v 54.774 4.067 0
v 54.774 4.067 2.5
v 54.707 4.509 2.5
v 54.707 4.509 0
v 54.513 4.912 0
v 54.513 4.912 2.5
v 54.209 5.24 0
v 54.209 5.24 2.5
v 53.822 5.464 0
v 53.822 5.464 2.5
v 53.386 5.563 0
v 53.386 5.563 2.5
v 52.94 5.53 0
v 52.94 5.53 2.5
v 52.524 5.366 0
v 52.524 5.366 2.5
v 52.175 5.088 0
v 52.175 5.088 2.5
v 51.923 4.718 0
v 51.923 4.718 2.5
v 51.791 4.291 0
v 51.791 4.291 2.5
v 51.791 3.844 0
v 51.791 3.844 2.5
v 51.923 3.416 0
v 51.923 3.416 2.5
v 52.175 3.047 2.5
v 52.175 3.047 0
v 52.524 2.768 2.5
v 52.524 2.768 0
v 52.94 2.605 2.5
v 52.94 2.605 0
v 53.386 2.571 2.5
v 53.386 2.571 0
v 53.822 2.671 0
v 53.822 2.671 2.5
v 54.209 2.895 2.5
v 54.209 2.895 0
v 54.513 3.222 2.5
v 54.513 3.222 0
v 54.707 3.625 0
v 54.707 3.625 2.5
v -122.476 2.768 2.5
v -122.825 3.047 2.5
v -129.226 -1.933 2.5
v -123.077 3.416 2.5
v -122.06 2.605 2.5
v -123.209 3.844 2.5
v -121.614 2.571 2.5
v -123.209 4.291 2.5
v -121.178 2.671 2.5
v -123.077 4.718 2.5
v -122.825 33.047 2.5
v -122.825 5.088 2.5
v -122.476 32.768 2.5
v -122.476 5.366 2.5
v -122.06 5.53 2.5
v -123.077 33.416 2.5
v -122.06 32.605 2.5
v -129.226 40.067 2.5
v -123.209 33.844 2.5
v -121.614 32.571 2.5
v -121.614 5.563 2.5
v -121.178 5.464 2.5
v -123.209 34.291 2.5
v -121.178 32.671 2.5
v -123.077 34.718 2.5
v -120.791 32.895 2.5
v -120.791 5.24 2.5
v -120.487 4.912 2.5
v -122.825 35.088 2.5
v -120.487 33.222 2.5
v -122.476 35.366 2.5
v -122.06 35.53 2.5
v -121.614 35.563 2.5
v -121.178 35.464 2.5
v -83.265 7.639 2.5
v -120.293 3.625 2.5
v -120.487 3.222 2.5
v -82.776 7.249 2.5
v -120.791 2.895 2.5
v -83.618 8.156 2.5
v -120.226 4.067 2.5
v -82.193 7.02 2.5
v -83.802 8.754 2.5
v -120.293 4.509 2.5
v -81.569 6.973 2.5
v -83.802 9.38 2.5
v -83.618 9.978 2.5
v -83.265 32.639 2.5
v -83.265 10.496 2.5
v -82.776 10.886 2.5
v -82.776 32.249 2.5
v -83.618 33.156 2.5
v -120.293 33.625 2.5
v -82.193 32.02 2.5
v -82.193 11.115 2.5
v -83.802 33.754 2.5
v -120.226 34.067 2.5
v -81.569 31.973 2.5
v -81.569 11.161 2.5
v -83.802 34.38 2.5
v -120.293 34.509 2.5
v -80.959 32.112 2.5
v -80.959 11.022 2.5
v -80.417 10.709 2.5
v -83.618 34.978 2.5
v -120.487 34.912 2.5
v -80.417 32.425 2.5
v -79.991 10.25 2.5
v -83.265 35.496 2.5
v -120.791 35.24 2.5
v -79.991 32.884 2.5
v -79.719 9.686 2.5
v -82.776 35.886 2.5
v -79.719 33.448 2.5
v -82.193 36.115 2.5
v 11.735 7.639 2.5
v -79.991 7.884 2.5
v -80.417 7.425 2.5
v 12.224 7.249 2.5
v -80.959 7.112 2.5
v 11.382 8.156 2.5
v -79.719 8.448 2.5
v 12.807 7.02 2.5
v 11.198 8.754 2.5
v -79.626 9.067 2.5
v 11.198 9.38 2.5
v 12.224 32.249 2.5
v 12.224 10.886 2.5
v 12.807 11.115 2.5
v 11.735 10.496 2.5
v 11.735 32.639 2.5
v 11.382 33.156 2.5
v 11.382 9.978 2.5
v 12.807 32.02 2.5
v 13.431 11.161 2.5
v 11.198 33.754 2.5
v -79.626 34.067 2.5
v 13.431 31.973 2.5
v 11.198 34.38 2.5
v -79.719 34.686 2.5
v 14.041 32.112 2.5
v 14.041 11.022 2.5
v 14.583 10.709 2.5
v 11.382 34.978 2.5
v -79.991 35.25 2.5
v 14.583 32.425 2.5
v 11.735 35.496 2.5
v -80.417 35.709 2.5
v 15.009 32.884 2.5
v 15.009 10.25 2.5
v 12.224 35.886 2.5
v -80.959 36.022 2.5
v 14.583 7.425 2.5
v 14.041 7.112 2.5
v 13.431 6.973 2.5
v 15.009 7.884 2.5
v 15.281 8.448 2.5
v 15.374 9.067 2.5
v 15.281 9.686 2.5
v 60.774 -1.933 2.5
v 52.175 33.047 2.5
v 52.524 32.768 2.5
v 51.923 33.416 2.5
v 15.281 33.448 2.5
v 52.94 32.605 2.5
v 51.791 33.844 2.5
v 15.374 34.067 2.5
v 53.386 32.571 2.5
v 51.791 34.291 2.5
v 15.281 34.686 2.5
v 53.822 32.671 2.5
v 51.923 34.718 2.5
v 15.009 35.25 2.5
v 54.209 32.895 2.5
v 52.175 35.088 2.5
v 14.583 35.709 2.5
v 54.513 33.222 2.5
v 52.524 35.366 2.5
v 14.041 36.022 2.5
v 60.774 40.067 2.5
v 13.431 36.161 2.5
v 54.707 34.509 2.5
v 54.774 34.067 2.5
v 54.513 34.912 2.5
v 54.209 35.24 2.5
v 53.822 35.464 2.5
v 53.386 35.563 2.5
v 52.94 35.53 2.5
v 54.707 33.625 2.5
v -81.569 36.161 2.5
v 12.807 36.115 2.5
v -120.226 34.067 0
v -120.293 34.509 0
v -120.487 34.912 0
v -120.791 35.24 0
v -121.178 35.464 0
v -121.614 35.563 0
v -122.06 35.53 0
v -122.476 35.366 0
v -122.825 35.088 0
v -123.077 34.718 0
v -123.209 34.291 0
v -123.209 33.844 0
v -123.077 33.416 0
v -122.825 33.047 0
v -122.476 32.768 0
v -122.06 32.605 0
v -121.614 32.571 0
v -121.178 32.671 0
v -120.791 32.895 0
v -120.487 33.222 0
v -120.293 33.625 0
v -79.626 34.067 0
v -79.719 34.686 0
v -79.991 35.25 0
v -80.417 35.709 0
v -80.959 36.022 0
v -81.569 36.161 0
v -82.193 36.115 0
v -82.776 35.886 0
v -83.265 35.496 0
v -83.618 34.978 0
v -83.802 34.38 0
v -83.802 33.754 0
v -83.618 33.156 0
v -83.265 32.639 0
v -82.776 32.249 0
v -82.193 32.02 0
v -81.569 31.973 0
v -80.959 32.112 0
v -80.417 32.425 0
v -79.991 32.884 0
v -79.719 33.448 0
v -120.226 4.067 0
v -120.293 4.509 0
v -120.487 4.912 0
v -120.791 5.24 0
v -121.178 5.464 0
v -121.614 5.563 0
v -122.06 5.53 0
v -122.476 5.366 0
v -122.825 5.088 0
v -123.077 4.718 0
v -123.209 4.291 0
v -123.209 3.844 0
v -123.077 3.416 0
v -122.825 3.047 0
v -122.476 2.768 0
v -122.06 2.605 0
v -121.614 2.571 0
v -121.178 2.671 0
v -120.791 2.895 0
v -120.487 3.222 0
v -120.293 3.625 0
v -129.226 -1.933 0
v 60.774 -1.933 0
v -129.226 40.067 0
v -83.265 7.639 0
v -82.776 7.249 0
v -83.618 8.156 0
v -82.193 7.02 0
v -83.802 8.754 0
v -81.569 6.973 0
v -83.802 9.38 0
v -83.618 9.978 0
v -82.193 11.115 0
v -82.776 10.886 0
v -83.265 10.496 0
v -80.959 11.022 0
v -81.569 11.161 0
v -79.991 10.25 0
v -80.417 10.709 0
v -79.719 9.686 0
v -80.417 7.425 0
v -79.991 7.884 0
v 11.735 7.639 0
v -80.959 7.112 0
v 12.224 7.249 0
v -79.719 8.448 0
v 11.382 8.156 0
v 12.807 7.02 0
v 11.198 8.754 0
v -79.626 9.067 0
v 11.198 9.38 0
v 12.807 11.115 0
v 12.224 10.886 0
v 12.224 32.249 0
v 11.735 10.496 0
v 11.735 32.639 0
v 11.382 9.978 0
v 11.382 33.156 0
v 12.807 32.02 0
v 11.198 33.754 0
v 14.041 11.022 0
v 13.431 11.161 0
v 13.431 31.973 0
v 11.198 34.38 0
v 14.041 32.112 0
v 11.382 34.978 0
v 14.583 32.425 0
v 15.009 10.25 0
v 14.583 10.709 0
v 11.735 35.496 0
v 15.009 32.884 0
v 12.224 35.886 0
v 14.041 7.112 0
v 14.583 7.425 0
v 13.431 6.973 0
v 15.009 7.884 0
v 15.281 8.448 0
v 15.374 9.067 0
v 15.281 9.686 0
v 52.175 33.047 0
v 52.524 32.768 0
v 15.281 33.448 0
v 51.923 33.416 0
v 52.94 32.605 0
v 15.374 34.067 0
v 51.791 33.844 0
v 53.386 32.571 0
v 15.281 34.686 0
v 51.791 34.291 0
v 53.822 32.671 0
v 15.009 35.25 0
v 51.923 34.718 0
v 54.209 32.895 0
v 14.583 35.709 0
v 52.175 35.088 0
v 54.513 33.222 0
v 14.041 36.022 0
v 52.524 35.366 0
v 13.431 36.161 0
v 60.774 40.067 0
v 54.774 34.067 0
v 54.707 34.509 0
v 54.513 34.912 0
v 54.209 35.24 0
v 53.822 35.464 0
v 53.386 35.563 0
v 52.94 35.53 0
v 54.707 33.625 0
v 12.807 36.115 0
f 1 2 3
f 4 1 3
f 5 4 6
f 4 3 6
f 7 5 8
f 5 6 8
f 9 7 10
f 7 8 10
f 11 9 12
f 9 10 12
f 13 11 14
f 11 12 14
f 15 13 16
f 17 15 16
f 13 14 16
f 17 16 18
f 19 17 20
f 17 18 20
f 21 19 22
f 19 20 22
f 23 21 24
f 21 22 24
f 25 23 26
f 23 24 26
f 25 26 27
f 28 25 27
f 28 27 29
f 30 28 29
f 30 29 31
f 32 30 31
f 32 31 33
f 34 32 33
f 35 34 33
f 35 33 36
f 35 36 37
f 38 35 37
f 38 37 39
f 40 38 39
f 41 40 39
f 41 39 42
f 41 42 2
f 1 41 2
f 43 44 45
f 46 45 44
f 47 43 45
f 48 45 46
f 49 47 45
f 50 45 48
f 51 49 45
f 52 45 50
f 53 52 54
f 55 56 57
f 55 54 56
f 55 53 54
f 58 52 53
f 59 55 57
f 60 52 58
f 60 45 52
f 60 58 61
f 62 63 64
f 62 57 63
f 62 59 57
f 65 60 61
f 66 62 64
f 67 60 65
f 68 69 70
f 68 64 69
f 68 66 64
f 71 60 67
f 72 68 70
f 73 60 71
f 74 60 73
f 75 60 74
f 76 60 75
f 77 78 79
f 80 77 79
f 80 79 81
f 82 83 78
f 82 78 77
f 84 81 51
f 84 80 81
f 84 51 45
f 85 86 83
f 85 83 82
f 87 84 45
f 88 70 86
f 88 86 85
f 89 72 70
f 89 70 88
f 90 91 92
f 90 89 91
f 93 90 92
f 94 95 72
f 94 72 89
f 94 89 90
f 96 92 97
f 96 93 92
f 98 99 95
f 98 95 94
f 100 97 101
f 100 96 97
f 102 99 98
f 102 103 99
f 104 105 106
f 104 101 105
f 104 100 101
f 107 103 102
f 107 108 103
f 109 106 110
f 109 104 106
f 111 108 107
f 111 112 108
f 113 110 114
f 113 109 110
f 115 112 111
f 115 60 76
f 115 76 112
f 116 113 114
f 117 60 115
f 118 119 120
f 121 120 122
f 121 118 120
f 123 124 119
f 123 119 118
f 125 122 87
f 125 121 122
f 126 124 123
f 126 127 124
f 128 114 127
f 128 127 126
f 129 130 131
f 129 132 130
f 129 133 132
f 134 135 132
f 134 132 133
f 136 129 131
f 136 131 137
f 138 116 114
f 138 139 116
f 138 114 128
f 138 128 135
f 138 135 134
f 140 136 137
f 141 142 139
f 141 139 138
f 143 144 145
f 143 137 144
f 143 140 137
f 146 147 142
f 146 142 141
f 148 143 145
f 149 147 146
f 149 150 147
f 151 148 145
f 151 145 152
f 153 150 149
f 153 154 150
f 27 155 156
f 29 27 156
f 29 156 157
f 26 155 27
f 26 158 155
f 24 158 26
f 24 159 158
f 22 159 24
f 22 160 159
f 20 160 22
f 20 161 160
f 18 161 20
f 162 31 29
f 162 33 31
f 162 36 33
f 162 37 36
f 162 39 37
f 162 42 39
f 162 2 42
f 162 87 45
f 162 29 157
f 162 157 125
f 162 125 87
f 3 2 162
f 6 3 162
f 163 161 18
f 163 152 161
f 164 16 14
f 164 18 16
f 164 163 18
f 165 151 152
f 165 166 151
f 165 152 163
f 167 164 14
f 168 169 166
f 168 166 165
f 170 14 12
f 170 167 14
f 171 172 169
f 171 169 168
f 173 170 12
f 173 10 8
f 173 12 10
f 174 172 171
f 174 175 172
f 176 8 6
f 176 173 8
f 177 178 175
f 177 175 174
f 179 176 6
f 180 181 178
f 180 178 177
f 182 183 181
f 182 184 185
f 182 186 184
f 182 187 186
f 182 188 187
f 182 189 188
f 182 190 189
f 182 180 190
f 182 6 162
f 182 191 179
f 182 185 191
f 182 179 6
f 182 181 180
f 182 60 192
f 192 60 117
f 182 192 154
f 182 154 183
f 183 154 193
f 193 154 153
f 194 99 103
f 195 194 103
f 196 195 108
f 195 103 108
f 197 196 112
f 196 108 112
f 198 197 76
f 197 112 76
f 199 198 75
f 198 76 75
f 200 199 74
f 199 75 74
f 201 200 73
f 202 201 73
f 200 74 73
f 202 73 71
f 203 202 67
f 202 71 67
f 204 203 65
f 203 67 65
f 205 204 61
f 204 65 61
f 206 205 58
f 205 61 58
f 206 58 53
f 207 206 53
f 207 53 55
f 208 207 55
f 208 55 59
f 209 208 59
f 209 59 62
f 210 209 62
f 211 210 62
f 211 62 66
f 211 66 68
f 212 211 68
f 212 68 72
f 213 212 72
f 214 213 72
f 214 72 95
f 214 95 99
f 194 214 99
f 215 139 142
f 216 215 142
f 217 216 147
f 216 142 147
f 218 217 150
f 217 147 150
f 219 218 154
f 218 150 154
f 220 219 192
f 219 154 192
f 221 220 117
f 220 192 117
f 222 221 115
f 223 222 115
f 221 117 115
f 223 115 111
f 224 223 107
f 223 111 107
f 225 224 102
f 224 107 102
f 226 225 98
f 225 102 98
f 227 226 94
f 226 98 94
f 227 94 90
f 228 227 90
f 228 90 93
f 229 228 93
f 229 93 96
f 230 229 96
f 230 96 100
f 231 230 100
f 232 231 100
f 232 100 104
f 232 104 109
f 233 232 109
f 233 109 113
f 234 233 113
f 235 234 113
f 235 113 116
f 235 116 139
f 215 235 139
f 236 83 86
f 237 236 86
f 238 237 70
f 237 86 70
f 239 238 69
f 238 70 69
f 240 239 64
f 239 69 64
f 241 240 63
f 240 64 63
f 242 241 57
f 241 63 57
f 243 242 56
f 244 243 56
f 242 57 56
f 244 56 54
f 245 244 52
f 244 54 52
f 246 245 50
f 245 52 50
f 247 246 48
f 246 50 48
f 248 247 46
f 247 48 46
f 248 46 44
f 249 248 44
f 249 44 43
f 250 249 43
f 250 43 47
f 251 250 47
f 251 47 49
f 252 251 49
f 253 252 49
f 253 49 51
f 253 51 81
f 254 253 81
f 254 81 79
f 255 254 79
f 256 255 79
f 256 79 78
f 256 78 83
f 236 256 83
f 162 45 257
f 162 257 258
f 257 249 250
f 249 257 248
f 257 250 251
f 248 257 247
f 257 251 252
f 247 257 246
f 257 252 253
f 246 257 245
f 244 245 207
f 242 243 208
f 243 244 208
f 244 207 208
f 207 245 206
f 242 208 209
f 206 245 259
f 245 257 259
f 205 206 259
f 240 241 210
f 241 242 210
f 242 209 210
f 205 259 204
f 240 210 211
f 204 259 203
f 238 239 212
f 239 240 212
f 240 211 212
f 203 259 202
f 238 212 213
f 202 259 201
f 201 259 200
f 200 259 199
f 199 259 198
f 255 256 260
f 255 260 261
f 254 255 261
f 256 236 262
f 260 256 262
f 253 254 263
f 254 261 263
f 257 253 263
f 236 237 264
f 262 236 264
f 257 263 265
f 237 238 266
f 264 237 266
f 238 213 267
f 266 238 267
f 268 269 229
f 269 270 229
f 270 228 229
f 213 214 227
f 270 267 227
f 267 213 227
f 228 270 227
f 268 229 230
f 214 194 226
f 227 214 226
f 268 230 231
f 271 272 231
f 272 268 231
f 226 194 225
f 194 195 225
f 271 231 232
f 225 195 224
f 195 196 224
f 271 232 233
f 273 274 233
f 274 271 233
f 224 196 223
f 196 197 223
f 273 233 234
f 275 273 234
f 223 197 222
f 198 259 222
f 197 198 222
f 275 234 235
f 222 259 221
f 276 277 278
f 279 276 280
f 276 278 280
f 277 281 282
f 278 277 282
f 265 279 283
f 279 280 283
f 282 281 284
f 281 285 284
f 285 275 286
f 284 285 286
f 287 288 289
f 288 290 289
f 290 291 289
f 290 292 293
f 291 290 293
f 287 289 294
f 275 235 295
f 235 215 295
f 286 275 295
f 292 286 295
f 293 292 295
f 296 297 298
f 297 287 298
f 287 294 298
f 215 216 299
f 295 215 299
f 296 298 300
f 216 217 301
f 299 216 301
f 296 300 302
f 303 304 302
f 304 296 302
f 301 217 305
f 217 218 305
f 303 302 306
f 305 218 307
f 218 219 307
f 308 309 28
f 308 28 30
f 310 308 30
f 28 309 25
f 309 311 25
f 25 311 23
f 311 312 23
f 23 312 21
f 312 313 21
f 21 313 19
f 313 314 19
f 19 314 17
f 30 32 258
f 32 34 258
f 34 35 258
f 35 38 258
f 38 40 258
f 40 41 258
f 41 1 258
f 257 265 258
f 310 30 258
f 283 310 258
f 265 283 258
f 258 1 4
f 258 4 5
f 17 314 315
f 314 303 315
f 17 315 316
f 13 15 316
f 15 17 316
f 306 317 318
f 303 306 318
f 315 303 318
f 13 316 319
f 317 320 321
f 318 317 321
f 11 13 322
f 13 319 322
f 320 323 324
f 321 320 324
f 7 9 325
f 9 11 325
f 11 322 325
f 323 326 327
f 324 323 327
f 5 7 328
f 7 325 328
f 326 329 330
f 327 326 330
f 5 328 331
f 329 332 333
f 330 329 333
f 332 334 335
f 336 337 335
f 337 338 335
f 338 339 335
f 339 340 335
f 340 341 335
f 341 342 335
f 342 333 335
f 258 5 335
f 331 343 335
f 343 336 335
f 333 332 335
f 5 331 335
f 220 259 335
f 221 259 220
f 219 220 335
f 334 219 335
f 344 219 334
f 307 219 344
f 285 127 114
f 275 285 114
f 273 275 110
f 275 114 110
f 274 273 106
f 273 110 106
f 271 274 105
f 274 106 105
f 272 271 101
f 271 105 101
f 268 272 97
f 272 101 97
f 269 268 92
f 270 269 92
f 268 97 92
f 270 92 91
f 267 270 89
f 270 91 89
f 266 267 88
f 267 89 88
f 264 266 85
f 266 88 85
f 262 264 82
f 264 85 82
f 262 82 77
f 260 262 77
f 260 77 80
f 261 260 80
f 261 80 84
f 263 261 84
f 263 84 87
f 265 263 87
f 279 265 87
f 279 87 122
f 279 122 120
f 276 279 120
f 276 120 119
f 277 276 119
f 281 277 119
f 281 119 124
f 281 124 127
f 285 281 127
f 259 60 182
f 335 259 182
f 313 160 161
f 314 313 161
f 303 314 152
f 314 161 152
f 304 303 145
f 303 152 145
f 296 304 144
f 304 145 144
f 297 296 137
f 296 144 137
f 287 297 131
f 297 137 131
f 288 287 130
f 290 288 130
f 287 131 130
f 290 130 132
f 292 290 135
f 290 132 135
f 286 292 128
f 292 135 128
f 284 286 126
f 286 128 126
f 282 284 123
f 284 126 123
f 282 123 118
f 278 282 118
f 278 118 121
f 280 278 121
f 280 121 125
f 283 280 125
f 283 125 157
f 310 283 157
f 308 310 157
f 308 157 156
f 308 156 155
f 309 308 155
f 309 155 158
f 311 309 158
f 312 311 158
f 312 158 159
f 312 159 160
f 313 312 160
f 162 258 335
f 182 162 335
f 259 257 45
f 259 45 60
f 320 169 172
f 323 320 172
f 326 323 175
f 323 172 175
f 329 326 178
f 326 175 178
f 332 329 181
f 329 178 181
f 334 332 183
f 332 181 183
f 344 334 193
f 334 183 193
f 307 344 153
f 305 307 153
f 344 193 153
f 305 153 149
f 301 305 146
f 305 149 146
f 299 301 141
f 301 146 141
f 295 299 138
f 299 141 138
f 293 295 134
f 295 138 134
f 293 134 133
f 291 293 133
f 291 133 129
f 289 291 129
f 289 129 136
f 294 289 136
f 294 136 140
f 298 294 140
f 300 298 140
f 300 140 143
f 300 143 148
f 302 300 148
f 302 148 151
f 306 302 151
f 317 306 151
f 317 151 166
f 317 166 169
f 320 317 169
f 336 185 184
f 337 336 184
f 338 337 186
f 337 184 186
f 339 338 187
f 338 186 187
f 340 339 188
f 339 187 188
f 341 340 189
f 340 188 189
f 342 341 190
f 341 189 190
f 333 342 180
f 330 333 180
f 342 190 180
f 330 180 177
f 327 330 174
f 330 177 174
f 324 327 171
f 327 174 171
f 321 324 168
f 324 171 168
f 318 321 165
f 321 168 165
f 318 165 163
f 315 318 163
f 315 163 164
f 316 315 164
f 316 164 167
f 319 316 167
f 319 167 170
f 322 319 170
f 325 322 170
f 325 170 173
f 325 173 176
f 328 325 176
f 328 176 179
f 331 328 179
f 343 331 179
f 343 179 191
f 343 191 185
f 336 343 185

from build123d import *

# Parameters (mm, degrees)
SKETCH1_W           = 190
SKETCH1_H           = 50
BOSS_EXTRUDE1_DEPTH = 2.5
SKETCH2_R           = 1.5
CUT_EXTRUDE1_DEPTH  = 3.5
SKETCH3_R           = 2.1
CUT_EXTRUDE2_DEPTH  = 3.5
SKETCH_2_W          = 199.955047508
SKETCH_2_H          = 60.796168266
SKETCH_2_W_2        = 190
SKETCH_2_H_2        = 42
CUT_EXTRUDE_1_DEPTH = 10


with BuildPart() as part:
    # Sketch1 → Boss-Extrude1 (new body)
    with BuildSketch(Plane.XY):
        with Locations((-34.225888325, 19.067258883)):
            Rectangle(SKETCH1_W, SKETCH1_H)
    extrude(amount=BOSS_EXTRUDE1_DEPTH)

    # Sketch2 → Cut-Extrude1 (cut, through all)
    with BuildSketch(Plane.XY.offset(2.5)):
        with Locations((-121.725888325, 34.067258883)):
            Circle(SKETCH2_R)
        with Locations((-121.725888325, 4.067258883)):
            Circle(SKETCH2_R)
        with Locations((53.274111675, 34.067258883)):
            Circle(SKETCH2_R)
        with Locations((53.274111675, 4.067258883)):
            Circle(SKETCH2_R)
    extrude(amount=-CUT_EXTRUDE1_DEPTH, mode=Mode.SUBTRACT)

    # Sketch3 → Cut-Extrude2 (cut, through all)
    with BuildSketch(Plane.XY.offset(2.5)):
        with Locations((-81.725888325, 34.067258883)):
            Circle(SKETCH3_R)
        with Locations((13.274111675, 34.067258883)):
            Circle(SKETCH3_R)
        with Locations((13.274111675, 9.067258883)):
            Circle(SKETCH3_R)
        with Locations((-81.725888325, 9.067258883)):
            Circle(SKETCH3_R)
    extrude(amount=-CUT_EXTRUDE2_DEPTH, mode=Mode.SUBTRACT)

    # 草图2 → 切除-拉伸1 (cut)
    with BuildSketch(Plane.XY.offset(2.5)):
        with Locations((-32.748481011, 19.803493347)):
            Rectangle(SKETCH_2_W, SKETCH_2_H)
        with Locations((-34.225888325, 19.067258883)):
            Rectangle(SKETCH_2_W_2, SKETCH_2_H_2, mode=Mode.SUBTRACT)
    extrude(amount=-CUT_EXTRUDE_1_DEPTH, mode=Mode.SUBTRACT)


solid = part.part
